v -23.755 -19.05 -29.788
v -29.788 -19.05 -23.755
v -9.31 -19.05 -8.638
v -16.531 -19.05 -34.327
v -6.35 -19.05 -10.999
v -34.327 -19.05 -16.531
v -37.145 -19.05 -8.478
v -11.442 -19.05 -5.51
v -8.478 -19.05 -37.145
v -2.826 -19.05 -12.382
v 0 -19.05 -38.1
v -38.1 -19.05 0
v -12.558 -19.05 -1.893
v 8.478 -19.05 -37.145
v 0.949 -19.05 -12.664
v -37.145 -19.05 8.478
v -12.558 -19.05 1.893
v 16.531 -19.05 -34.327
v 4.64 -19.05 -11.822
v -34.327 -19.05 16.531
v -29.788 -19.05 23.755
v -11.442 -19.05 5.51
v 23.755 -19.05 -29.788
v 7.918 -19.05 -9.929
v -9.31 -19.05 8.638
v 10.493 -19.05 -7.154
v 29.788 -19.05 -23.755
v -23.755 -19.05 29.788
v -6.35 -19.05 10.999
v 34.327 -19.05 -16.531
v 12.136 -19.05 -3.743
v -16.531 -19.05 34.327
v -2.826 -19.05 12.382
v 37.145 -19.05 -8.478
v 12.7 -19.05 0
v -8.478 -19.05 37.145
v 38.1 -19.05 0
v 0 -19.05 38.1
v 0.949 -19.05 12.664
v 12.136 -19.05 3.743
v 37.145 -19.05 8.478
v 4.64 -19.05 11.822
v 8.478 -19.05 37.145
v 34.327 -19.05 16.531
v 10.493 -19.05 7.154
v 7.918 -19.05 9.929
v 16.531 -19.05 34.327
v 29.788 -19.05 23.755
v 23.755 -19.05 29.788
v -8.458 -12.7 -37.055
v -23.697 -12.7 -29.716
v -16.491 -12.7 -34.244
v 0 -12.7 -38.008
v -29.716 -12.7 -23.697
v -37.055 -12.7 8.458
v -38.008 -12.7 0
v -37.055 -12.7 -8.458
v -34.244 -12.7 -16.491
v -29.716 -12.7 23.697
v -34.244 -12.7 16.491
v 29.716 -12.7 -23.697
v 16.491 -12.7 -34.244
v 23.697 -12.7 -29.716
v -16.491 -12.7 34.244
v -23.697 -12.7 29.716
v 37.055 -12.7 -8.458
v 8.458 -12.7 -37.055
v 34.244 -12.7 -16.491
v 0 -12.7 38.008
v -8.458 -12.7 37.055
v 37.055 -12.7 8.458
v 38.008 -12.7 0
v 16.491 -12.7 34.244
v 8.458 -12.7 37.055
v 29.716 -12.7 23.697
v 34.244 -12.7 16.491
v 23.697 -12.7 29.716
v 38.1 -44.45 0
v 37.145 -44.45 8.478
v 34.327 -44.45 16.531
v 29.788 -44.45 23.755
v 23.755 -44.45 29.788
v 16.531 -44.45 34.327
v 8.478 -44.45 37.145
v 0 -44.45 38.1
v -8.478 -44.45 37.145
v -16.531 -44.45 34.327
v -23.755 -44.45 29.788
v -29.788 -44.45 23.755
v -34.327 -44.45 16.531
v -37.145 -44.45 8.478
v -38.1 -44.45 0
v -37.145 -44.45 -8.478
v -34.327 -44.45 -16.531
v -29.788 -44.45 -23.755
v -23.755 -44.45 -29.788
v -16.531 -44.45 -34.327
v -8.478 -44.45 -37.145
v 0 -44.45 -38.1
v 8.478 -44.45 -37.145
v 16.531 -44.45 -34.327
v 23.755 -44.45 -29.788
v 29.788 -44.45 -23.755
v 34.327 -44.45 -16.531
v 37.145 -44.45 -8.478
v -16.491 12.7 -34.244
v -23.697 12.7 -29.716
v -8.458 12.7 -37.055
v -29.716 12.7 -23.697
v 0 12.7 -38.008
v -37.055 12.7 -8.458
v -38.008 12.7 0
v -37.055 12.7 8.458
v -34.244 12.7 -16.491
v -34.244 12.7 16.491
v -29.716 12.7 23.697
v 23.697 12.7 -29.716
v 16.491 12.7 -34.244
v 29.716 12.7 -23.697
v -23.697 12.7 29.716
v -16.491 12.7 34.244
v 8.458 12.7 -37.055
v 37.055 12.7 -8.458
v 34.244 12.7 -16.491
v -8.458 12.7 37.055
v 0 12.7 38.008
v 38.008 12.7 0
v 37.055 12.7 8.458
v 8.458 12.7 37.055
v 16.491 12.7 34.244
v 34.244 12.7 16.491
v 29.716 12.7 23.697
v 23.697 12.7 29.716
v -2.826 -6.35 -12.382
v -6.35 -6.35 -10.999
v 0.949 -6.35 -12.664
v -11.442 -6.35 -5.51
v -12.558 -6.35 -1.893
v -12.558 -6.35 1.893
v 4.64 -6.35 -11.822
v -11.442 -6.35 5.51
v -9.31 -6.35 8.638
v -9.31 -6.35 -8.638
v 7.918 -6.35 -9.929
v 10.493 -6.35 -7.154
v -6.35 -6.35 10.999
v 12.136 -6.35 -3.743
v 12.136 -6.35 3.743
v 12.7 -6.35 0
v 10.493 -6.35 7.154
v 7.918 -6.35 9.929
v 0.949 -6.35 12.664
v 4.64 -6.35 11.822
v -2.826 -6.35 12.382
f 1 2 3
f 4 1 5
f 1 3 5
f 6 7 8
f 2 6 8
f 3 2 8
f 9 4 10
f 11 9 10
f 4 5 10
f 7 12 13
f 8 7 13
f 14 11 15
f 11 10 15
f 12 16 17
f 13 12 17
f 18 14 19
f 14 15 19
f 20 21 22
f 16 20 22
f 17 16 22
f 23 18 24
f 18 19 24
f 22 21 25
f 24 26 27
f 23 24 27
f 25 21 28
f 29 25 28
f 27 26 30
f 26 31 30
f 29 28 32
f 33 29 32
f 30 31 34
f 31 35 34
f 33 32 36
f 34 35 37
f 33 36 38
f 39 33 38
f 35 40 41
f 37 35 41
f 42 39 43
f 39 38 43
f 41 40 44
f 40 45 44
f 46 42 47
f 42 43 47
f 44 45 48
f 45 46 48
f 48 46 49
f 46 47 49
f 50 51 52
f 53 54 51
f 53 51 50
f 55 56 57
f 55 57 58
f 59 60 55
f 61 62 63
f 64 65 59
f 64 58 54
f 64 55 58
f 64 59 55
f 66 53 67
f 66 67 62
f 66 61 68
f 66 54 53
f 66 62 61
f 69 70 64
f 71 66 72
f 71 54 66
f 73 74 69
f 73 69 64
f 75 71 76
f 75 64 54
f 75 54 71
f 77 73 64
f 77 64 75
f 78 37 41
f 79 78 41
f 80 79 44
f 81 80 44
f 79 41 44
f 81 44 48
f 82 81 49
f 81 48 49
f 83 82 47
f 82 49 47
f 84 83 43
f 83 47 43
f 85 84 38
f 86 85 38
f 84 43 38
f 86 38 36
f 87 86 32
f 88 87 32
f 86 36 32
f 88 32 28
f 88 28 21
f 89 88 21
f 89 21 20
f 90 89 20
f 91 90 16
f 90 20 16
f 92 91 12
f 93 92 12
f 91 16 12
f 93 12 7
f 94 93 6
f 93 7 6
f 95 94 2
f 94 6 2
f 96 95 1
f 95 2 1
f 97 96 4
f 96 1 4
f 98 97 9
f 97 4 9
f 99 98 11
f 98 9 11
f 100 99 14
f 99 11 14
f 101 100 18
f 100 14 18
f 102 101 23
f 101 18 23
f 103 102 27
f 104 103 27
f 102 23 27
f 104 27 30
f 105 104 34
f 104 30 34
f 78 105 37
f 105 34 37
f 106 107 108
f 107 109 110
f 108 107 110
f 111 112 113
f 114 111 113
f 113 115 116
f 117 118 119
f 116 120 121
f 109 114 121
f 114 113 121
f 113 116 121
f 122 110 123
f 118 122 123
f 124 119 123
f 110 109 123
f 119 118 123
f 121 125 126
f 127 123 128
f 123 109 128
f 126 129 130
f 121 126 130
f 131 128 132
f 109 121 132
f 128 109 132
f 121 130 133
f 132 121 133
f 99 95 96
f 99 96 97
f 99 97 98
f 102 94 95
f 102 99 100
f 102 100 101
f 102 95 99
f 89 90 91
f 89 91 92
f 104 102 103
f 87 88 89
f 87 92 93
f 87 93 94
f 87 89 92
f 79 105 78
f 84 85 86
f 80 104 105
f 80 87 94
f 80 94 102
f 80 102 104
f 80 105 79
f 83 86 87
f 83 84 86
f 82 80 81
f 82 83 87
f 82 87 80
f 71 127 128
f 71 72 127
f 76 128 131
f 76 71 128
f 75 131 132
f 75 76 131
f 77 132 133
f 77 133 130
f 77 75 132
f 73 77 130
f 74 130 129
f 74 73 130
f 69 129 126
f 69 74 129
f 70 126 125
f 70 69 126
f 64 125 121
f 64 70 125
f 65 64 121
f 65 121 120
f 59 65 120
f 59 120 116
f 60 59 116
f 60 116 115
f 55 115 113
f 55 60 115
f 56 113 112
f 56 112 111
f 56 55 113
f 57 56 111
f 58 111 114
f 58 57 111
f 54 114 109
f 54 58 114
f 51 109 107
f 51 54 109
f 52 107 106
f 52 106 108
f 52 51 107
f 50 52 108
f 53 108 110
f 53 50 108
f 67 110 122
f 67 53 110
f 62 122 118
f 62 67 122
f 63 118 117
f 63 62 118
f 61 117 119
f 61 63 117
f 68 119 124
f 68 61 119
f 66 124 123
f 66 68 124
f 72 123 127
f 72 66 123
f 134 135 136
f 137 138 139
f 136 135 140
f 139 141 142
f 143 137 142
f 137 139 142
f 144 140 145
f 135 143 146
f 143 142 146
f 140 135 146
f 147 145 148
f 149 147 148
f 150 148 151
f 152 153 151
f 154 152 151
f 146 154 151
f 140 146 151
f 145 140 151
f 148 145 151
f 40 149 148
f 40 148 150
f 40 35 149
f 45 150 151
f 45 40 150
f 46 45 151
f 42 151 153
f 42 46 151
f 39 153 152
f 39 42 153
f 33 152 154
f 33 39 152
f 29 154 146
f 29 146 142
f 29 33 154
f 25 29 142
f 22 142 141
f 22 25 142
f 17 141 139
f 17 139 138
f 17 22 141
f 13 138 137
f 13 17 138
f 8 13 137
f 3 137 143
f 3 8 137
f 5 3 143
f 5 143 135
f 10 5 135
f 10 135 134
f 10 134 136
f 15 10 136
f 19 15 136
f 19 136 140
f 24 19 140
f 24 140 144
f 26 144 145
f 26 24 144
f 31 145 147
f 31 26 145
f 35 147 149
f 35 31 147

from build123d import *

# Parameters (mm, degrees)
F0_R     = 38.007722
F1_DEPTH = 12.7
F2_R     = 12.7
F3_DEPTH = 6.35
F4_R     = 38.1
F5_DEPTH = 25.4


with BuildPart() as f1:
    # F0 (on Front) → F1 (new body, symmetric)
    with BuildSketch(Plane.XZ):
        Circle(F0_R)
    extrude(amount=F1_DEPTH, both=True)


with BuildPart() as f3:
    # F2 (on face) → F3 (new body, symmetric)
    with BuildSketch(Plane.XZ.offset(12.7)):
        Circle(F2_R)
    extrude(amount=F3_DEPTH, both=True)

    # F4 (on face) → F5 (join)
    with BuildSketch(Plane.XZ.offset(19.05)):
        Circle(F4_R)
    extrude(amount=F5_DEPTH)


solid = Compound([f1.part, f3.part])
